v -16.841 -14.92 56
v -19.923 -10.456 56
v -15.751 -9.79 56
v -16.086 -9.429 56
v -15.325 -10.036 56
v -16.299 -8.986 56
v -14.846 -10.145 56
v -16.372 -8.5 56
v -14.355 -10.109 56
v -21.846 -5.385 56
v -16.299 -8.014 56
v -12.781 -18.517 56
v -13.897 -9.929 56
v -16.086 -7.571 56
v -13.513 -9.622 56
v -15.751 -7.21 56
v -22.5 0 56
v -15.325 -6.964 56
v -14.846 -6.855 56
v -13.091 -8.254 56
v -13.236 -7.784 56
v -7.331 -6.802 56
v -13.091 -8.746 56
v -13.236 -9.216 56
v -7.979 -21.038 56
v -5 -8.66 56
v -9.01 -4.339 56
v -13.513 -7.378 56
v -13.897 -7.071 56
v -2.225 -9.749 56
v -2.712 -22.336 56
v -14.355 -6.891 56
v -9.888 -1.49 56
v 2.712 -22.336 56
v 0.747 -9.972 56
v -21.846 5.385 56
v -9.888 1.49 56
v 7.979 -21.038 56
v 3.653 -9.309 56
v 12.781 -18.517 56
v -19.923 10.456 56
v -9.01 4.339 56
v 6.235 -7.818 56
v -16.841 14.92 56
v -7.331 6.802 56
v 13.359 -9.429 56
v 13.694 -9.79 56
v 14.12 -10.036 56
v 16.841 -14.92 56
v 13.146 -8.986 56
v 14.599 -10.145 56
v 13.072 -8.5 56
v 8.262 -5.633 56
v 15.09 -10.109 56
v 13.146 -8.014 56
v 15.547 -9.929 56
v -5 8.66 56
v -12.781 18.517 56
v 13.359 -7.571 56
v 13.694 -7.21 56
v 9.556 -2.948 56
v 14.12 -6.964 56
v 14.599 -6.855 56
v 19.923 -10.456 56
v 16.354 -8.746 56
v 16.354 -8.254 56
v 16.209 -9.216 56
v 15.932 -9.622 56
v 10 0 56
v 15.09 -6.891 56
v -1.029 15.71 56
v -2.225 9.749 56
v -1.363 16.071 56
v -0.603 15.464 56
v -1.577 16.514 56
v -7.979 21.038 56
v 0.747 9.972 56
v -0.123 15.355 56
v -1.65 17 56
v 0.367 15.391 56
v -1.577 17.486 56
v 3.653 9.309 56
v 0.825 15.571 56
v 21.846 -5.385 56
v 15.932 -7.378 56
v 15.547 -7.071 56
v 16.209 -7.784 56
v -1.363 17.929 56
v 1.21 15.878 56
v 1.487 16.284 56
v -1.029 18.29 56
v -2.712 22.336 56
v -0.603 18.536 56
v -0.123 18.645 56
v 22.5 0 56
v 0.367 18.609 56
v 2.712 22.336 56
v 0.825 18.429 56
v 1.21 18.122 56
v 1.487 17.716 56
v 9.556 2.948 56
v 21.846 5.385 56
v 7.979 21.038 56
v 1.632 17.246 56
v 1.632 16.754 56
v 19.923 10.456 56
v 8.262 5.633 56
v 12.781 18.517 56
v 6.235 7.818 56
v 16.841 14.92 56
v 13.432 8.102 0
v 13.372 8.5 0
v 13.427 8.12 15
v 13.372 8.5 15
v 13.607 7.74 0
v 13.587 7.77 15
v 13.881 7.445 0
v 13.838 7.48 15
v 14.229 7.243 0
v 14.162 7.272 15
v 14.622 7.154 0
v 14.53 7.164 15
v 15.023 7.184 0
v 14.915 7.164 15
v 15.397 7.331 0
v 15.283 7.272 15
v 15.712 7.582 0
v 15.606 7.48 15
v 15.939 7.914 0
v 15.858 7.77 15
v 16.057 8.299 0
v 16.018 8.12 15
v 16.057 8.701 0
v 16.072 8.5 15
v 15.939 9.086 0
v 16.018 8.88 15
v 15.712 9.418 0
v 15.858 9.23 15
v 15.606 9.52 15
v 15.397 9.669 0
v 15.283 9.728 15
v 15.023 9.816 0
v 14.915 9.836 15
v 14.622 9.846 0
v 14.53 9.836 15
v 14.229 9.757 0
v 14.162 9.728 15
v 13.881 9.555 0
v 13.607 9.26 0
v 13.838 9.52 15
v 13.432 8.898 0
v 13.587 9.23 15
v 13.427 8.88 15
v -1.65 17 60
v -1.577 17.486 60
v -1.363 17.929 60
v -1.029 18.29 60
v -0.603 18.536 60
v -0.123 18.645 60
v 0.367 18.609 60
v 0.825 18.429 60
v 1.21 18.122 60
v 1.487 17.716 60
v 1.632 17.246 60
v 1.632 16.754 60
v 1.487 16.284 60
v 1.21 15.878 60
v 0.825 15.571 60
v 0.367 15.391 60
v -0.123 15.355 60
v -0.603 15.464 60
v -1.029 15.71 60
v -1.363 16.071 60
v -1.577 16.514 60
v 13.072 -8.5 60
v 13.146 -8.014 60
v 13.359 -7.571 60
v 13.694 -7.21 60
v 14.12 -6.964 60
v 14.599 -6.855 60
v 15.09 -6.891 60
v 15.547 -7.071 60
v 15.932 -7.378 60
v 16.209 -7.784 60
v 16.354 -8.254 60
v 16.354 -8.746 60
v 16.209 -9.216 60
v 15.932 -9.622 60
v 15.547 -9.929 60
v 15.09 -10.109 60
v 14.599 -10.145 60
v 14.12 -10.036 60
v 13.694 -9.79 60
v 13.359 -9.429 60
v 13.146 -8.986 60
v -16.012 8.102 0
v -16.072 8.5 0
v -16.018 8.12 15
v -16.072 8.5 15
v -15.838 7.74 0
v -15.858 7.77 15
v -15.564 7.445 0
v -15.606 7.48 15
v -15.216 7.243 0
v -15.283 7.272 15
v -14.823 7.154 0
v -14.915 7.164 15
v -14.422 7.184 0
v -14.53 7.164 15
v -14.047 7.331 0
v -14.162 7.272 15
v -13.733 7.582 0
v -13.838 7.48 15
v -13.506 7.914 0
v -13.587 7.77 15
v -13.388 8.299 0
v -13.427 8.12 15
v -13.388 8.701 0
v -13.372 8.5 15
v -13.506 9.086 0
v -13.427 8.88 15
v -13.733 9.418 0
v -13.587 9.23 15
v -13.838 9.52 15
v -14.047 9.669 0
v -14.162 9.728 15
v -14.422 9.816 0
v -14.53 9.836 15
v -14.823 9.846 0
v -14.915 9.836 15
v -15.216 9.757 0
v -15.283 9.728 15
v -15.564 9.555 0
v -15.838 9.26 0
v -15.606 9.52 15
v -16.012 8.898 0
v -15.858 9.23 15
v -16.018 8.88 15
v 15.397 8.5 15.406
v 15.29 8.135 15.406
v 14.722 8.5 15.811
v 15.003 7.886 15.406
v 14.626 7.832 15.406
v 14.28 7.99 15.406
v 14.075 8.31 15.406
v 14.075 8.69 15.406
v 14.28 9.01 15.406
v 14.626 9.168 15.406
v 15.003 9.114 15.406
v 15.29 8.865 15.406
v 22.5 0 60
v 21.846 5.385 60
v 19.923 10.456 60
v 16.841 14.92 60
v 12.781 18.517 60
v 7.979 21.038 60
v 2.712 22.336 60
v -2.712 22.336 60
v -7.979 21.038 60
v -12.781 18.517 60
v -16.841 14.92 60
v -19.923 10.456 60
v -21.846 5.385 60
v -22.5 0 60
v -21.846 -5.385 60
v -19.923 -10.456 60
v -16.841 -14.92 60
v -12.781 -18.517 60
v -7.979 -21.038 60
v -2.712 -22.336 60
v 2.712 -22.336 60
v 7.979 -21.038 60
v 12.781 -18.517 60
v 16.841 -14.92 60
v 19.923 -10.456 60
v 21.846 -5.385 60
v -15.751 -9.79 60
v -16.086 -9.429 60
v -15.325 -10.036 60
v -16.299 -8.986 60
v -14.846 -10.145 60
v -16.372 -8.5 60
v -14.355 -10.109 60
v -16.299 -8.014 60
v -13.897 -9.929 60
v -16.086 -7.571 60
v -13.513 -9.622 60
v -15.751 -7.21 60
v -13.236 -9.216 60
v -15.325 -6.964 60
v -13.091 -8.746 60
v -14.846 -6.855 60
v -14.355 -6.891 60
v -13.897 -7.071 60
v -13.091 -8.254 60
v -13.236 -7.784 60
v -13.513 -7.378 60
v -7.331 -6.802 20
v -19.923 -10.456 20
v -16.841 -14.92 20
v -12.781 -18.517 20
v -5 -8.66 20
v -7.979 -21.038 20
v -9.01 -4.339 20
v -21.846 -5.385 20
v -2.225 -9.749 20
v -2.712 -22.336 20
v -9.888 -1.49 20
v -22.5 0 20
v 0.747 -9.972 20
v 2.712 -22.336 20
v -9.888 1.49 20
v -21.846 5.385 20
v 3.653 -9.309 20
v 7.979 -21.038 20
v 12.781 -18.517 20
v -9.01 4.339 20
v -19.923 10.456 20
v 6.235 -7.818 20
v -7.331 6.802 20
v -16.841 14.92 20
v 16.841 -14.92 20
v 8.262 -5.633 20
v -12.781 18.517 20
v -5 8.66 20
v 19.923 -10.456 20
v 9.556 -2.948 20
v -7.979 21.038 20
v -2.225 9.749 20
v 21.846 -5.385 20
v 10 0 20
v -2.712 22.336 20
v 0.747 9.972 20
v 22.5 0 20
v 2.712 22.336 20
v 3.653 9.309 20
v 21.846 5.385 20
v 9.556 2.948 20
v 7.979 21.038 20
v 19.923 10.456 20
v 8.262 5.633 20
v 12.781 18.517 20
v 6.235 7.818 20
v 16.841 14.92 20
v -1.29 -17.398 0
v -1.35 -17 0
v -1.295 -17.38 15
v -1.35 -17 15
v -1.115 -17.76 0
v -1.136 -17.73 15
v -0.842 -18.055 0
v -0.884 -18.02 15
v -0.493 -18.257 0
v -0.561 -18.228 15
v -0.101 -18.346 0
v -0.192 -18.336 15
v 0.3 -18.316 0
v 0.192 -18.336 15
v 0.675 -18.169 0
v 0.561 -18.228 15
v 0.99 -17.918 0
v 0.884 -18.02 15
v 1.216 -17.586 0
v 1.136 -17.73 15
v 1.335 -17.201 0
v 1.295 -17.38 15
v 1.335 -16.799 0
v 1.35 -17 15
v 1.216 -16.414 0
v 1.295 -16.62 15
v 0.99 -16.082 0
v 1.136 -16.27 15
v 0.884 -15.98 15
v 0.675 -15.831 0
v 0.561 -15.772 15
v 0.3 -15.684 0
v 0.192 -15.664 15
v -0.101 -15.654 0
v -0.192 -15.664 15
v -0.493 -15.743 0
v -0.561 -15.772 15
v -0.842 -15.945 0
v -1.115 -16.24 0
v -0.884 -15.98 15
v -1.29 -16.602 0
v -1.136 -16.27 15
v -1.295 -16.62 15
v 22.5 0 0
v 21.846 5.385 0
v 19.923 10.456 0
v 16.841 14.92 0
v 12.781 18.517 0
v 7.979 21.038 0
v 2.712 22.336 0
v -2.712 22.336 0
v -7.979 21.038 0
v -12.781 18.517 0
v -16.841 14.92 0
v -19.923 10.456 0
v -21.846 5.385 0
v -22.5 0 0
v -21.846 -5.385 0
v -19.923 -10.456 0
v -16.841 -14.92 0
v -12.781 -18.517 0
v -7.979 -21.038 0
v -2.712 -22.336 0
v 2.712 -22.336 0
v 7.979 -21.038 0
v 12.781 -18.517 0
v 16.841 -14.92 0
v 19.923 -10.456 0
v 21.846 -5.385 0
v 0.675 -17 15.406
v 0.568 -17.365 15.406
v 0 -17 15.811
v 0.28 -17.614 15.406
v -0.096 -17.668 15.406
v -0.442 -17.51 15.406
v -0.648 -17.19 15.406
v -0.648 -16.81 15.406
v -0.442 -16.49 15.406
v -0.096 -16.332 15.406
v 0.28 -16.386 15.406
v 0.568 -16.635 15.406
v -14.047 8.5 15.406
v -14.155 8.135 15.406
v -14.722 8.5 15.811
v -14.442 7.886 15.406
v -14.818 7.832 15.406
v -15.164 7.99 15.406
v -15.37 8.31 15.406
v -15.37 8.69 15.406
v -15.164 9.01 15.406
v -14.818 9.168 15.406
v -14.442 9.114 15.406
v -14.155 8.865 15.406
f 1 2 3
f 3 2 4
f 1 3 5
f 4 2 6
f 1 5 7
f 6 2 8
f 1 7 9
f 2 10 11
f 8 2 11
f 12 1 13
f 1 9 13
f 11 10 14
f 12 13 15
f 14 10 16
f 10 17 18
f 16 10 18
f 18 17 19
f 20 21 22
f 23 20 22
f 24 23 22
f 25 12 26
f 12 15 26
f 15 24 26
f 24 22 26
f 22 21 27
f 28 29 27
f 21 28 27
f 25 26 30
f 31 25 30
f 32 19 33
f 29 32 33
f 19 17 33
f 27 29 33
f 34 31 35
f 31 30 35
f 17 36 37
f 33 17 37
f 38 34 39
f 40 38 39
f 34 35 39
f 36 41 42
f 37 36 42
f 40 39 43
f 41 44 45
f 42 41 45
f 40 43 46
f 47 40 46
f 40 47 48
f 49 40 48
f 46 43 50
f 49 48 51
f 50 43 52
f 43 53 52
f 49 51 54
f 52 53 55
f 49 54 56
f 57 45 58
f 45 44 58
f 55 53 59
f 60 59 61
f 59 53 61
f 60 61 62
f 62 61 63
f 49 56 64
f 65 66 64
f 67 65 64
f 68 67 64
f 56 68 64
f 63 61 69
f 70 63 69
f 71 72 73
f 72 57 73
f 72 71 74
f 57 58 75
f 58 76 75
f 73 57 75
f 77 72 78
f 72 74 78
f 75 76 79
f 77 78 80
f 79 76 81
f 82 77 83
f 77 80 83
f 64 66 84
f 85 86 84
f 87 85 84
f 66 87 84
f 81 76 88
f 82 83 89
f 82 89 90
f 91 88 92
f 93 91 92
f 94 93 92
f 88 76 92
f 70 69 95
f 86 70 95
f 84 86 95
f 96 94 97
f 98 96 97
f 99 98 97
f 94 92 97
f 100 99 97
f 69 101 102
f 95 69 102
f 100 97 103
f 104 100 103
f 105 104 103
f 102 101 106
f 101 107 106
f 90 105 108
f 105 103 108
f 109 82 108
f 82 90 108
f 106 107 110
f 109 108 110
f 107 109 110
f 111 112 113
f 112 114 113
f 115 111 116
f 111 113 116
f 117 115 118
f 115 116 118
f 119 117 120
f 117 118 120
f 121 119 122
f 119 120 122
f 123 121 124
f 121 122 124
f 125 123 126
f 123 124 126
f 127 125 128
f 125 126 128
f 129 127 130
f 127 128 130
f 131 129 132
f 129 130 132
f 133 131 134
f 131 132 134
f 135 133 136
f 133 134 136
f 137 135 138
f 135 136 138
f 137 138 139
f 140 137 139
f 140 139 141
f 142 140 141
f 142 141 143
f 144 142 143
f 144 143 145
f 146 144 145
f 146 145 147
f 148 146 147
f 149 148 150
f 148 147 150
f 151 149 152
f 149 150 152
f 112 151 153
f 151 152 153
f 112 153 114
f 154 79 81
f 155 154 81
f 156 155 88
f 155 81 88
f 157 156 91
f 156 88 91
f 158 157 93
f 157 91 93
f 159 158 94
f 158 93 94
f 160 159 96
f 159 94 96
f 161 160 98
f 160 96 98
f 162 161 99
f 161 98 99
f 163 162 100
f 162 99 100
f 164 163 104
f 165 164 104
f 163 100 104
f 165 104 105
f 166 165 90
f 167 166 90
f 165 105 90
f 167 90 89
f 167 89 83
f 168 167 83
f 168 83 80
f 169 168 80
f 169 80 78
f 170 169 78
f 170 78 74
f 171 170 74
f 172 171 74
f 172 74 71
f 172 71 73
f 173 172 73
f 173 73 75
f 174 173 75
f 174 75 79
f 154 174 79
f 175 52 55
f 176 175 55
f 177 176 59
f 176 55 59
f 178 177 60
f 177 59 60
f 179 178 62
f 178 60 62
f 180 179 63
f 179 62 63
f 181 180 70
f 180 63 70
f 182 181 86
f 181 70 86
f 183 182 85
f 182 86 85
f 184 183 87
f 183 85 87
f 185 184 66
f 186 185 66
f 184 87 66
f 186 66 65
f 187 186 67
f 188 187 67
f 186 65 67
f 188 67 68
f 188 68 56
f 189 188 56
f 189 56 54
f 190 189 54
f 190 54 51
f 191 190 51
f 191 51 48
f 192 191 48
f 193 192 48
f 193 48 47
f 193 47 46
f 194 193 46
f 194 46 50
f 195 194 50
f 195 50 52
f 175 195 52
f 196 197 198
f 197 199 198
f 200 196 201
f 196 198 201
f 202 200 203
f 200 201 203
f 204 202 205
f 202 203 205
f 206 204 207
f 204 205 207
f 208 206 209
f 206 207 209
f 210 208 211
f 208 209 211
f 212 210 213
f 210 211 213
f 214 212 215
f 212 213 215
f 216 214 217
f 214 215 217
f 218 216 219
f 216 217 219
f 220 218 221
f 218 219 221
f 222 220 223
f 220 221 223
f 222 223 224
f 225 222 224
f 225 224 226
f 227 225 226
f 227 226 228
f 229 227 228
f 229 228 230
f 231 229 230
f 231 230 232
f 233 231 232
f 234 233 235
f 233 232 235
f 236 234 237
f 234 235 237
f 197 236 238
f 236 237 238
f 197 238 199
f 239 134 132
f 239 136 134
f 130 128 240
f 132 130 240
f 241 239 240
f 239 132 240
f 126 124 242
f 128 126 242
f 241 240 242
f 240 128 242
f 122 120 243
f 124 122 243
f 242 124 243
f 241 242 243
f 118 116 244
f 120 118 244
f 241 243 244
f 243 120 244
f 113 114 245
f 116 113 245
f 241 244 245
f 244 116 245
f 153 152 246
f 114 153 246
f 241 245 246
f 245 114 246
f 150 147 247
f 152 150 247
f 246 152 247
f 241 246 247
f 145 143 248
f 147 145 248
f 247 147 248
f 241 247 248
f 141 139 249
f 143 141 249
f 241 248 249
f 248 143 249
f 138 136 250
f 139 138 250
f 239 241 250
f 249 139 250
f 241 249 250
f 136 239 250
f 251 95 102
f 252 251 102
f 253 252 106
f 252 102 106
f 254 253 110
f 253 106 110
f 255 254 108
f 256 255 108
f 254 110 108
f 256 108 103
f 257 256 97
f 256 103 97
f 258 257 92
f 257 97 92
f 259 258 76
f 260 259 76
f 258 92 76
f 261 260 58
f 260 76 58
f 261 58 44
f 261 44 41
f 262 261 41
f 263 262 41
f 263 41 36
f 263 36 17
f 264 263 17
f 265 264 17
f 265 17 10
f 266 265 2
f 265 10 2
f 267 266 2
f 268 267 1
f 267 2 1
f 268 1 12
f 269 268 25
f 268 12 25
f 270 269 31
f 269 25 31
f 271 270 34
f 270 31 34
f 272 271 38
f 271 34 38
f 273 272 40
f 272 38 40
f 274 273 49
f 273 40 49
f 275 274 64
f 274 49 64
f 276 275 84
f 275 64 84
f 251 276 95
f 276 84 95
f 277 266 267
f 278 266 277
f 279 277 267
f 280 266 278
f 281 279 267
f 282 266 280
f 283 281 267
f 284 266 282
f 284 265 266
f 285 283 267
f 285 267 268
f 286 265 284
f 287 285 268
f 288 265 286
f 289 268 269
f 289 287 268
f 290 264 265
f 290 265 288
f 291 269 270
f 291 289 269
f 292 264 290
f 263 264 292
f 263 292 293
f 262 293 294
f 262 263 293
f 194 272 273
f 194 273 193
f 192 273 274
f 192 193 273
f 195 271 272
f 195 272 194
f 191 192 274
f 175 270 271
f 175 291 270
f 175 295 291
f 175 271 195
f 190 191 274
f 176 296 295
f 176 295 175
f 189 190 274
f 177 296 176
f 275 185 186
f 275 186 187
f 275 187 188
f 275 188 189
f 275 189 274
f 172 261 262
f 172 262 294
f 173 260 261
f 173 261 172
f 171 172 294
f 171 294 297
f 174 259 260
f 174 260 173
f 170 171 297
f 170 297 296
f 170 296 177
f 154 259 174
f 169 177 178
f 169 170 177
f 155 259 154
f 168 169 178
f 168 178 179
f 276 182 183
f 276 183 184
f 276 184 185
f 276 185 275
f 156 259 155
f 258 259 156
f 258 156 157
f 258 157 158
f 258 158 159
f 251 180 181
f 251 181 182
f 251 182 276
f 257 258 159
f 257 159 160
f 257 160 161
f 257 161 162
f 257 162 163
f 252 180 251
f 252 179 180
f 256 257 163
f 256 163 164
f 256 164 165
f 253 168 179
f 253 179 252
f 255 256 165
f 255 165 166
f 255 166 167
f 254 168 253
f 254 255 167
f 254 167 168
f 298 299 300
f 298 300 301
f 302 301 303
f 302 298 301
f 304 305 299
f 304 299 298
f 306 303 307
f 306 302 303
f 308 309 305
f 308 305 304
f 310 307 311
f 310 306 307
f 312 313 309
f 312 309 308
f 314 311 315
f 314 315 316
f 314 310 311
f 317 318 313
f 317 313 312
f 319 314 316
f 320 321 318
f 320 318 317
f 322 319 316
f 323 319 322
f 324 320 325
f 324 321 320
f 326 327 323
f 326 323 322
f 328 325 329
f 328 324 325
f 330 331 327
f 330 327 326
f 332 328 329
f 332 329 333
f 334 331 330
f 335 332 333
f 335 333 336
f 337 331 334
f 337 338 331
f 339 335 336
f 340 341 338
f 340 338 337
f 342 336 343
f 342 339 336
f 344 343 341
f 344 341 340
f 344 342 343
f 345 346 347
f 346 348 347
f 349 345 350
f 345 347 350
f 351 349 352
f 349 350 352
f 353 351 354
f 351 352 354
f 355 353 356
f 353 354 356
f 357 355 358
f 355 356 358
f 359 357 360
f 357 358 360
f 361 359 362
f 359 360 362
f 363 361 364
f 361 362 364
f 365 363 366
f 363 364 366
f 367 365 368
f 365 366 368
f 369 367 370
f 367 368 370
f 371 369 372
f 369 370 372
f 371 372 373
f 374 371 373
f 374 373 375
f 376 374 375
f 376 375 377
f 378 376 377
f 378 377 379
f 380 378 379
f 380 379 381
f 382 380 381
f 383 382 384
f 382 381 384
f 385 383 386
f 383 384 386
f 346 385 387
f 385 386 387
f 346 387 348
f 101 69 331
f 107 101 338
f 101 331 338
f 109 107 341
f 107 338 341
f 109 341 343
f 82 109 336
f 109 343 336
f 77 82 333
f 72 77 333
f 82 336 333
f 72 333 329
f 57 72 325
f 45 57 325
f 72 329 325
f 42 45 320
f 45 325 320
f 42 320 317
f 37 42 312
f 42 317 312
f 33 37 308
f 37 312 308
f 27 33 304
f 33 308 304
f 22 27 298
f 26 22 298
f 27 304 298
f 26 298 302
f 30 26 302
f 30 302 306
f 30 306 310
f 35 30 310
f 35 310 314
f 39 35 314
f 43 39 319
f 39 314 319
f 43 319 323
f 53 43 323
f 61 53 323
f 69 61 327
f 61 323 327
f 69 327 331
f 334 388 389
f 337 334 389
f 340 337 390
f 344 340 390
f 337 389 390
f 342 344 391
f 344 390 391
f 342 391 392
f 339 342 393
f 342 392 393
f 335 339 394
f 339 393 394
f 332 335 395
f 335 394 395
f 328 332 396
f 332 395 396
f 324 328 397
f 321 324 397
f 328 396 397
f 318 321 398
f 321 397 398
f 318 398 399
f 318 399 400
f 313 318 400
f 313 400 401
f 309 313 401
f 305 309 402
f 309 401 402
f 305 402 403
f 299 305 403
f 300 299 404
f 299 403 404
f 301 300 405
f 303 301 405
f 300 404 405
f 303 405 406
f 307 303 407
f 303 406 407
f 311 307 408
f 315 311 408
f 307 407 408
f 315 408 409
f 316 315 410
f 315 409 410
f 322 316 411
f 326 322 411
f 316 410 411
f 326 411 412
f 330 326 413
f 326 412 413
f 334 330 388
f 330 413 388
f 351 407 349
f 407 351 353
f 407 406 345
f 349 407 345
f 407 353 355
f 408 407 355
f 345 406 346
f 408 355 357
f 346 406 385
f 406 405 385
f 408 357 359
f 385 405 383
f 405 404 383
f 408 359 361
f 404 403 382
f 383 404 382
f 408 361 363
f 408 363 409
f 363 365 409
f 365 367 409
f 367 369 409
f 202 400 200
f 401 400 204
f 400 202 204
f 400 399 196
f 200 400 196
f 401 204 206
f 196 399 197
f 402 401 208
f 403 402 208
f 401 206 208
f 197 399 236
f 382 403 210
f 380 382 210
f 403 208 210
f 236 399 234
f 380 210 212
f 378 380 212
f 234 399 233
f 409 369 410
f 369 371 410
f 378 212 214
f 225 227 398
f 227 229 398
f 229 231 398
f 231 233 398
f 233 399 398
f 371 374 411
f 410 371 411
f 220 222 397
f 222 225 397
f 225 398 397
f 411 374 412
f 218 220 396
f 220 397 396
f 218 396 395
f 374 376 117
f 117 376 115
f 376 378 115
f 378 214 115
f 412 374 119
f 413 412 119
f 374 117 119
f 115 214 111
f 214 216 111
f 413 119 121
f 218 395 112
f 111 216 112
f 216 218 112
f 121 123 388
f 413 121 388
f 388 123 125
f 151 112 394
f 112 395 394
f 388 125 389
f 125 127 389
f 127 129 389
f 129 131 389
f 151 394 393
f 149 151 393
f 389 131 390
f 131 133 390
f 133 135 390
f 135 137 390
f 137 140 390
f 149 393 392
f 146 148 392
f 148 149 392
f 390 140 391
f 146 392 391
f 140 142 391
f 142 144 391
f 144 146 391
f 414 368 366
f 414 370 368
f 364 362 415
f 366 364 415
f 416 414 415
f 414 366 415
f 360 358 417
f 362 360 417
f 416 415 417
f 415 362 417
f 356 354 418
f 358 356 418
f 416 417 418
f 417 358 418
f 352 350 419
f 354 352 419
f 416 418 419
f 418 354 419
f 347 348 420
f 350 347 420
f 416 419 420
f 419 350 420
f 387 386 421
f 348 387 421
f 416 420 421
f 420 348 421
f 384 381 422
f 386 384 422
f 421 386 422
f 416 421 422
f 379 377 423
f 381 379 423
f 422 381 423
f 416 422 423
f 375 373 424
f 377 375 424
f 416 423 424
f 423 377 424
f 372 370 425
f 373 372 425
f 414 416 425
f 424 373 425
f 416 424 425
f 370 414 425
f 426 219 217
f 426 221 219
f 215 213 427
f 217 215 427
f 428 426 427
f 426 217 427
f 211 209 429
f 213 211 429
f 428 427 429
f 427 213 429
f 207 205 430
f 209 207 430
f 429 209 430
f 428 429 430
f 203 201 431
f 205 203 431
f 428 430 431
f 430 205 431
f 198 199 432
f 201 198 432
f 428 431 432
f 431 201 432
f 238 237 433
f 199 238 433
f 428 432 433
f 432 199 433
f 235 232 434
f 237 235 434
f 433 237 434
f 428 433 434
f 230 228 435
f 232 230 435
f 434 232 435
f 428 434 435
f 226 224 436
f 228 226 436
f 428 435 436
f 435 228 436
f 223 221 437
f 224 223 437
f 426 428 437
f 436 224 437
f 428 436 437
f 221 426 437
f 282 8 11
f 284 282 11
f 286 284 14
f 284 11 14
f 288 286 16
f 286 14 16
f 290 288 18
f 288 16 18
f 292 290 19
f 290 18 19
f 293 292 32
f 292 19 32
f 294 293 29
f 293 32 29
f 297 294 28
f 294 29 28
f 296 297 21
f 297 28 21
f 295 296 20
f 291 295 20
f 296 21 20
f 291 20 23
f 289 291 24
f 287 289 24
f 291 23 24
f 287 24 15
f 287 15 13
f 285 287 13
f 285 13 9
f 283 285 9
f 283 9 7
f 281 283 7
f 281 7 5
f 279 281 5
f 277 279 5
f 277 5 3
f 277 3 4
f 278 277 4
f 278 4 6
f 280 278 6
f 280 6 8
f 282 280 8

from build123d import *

# Parameters (mm, degrees)
F1_DEPTH = 20
F2_R     = 10
F3_DEPTH = 36
F4_R     = 22.5
F4_R_2   = 10
F5_DEPTH = 4
F7_D     = 3.3
F7_DEPTH = 10
F7_TIP   = 0.9914200214
F9_D     = 2.7
F9_DEPTH = 15
F9_TIP   = 0.8111618357


with BuildPart() as f1:
    # F0 (on Top) → F1 (new body)
    with BuildSketch(Plane.XY):
        with BuildLine():
            ThreePointArc((-22.5, 0), (0, -22.5), (22.5, 0))
            ThreePointArc((22.5, 0), (0, 22.5), (-22.5, 0))
        make_face()
    extrude(amount=F1_DEPTH)

    # F2 (on face) → F3 (join)
    with BuildSketch(Plane.XY.offset(20)):
        Circle(F2_R)
    extrude(amount=F3_DEPTH)

    # F4 (on face) → F5 (join)
    with BuildSketch(Plane.XY.offset(56)):
        Circle(F4_R)
        Circle(F4_R_2, mode=Mode.SUBTRACT)
        Circle(F4_R_2)
    extrude(amount=F5_DEPTH)

    # F7
    with Locations(Plane.XY.offset(60)):
        with Locations((0, 17), (14.7224318643, -8.5), (-14.7224318643, -8.5)):
            Hole(F7_D / 2, depth=F7_DEPTH)
            with Locations((0, 0, -(F7_DEPTH + F7_TIP / 2))):  # 118° drill point
                Cone(0, F7_D / 2, F7_TIP, mode=Mode.SUBTRACT)

    # F9
    with Locations(Plane(origin=(0, 0, 0), x_dir=(1, 0, 0), z_dir=(0, 0, -1))):
        with Locations((14.7224318643, -8.5), (-14.7224318643, -8.5), (0, 17)):
            Hole(F9_D / 2, depth=F9_DEPTH)
            with Locations((0, 0, -(F9_DEPTH + F9_TIP / 2))):  # 118° drill point
                Cone(0, F9_D / 2, F9_TIP, mode=Mode.SUBTRACT)


solid = f1.part
